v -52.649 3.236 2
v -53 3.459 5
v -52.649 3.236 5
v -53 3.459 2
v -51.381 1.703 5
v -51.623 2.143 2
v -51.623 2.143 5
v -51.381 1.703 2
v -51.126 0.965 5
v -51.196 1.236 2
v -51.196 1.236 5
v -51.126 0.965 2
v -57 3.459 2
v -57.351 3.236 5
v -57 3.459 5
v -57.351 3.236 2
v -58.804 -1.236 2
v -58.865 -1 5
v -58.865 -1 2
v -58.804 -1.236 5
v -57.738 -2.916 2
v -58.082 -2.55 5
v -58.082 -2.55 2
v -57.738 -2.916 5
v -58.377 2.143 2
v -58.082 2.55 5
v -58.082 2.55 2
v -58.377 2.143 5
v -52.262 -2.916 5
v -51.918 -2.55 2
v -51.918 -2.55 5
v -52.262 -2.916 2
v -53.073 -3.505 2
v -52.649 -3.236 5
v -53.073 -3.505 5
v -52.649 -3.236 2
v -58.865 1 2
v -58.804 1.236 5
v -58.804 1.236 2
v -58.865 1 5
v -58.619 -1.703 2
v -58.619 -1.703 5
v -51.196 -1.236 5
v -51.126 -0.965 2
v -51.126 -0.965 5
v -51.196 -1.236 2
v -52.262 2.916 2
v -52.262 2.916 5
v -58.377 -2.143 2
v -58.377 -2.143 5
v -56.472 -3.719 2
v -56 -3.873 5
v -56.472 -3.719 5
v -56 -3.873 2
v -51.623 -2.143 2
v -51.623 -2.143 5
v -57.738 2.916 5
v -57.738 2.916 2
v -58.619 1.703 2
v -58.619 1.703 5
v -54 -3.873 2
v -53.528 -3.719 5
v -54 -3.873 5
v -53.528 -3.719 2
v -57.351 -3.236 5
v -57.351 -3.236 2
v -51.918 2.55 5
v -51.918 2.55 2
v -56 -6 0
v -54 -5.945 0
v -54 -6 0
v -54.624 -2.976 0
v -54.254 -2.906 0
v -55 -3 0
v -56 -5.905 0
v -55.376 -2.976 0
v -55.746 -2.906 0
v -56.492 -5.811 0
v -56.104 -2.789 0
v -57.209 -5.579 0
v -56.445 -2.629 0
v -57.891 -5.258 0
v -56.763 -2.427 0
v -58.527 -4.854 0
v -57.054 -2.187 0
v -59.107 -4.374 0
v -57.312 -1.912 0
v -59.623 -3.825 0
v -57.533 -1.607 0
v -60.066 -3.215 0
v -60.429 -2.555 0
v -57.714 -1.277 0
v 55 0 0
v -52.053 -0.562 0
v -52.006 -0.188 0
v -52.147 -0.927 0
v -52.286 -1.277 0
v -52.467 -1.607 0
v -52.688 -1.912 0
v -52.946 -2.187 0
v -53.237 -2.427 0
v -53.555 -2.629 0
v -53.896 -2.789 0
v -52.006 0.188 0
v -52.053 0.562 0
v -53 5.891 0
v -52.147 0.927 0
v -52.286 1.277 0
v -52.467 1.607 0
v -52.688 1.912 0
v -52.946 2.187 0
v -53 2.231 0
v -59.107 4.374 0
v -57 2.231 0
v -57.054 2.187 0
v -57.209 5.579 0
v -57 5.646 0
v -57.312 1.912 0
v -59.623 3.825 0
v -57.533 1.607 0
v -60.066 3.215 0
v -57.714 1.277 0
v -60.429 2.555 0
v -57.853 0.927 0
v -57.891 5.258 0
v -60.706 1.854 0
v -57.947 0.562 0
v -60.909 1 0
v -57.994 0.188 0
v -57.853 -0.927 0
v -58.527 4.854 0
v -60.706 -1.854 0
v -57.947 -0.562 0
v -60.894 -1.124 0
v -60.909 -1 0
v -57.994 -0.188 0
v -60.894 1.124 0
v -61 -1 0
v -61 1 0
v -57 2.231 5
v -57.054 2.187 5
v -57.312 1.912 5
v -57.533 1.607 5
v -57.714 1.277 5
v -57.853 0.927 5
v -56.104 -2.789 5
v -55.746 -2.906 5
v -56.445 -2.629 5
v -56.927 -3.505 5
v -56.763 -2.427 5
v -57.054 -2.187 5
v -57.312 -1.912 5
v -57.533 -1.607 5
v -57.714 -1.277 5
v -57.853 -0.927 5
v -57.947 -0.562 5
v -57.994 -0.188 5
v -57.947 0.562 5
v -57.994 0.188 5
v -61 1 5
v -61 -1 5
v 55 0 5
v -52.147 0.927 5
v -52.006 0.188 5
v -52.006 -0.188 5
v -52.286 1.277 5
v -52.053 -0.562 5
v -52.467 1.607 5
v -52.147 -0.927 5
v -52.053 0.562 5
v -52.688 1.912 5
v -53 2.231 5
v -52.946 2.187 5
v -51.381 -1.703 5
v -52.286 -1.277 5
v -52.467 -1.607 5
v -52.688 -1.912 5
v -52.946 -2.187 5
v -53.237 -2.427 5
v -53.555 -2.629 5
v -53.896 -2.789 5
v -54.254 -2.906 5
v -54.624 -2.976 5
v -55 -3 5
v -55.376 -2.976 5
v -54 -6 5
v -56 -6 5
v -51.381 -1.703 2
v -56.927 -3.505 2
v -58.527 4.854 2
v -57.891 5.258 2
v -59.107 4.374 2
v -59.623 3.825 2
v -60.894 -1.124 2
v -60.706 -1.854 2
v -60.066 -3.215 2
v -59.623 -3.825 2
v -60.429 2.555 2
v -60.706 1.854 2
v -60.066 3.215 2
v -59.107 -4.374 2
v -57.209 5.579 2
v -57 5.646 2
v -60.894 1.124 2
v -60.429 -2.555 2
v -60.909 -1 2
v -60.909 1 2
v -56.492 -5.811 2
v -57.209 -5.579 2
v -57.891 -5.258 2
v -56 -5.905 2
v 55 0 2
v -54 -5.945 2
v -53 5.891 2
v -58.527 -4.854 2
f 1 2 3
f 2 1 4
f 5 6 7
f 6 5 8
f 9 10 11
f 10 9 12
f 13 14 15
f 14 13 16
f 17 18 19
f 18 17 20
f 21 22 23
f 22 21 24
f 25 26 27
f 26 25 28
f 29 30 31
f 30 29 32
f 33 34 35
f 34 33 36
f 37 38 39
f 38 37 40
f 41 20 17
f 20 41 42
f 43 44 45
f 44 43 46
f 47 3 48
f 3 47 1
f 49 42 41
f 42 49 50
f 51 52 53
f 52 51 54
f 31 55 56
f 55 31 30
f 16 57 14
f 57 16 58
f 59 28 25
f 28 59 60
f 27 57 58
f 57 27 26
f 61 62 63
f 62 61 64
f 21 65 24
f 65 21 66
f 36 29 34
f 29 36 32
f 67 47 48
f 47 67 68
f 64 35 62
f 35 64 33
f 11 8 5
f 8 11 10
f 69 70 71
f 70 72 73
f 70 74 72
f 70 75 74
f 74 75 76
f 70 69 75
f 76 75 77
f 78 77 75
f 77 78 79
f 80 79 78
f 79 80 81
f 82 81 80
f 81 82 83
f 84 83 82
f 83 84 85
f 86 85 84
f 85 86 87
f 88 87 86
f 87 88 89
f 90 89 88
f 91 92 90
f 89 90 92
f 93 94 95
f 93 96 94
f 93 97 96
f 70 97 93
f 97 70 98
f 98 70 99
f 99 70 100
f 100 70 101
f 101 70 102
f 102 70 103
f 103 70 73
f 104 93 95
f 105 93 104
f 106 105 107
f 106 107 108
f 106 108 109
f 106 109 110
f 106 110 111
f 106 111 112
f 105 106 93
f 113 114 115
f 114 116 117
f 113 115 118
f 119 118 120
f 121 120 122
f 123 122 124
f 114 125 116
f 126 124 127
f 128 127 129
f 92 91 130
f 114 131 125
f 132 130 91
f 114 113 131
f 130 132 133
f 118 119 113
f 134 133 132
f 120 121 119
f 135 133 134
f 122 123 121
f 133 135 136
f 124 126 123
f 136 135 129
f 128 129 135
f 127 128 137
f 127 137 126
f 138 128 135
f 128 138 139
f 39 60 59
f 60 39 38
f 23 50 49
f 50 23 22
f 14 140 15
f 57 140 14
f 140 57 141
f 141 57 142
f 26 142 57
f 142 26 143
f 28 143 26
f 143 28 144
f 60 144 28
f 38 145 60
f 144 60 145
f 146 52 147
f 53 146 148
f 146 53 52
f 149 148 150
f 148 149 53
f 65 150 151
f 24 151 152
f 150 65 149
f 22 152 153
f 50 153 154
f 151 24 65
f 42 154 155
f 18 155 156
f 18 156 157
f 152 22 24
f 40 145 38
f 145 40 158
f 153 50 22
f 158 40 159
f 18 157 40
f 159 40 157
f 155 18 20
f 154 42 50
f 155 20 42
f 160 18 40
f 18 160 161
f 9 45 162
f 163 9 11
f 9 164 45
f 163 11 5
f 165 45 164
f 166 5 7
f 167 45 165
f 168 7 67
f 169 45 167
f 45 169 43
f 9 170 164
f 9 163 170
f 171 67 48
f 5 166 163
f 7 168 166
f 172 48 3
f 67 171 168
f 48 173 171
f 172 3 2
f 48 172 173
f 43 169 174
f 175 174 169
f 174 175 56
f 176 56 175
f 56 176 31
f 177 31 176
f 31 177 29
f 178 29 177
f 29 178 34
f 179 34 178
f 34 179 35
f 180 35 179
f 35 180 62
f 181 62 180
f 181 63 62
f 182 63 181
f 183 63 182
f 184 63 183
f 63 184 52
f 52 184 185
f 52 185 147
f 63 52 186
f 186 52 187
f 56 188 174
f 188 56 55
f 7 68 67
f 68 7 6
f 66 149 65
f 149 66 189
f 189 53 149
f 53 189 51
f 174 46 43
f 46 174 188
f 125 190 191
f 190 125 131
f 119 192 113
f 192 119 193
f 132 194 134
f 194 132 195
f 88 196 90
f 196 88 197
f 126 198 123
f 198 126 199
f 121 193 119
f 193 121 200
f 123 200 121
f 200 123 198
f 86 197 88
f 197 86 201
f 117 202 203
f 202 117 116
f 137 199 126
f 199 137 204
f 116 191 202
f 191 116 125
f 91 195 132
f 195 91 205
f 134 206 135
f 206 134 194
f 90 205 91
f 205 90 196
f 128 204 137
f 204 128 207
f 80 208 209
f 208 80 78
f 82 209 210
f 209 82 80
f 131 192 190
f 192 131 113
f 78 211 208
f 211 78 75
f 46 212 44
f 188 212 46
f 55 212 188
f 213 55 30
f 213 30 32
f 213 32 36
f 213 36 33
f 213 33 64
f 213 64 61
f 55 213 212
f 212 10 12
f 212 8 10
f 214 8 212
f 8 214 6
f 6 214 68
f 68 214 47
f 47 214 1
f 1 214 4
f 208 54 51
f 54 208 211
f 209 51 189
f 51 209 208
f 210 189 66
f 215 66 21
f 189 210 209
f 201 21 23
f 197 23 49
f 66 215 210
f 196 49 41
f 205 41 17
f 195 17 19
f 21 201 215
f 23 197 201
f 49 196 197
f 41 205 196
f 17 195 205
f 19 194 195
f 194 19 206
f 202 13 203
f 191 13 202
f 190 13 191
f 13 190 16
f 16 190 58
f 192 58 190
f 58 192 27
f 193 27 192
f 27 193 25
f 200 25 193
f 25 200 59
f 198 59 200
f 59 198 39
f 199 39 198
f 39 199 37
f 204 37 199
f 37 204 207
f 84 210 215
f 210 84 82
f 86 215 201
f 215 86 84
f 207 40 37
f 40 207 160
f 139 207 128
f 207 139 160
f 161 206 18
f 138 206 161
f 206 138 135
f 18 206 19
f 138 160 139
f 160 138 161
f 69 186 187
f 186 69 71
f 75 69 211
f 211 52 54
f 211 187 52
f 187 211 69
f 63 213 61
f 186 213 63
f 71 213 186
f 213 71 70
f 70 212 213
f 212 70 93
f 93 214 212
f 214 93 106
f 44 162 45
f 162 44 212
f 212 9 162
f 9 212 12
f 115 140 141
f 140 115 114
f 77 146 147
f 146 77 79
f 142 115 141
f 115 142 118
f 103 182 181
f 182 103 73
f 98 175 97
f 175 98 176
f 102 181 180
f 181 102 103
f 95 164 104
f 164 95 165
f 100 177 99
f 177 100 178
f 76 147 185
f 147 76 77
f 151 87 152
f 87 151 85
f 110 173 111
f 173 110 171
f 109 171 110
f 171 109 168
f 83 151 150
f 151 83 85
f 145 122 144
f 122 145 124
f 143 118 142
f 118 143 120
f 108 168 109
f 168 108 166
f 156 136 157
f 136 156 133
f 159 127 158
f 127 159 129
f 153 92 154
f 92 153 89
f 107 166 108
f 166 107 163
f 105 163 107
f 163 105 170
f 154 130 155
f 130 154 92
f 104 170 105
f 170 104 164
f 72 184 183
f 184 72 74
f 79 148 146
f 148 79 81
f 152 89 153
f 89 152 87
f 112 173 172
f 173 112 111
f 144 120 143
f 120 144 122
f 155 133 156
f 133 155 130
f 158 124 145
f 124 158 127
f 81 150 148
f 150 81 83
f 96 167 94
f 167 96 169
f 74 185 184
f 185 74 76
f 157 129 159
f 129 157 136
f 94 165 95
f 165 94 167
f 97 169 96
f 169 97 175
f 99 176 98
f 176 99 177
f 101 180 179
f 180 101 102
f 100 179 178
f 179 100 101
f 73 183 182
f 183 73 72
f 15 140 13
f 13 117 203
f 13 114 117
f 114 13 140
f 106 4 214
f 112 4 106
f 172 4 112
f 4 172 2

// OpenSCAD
// Garden irrigation hose stake by Brian Enigma
// The defaults are designed for a 1/4" hose.  Feel free to adjust as needed.

// This is the inside diameter of the hook part.  Coincidentally, it's also the
// outside diameter of your hose.
INSIDE_DIAMETER = 6;

// This is the overall length of the stake
LENGTH = 110;

// This is the height (or thickness, depending on how you look at it) of the
// tallest part of the stake -- the thickness of the reinforcing ring and
// bars.
HEIGHT = 5;

// This is the thickness of all the rest of the stake that isn't a reinforcing
// ring or bar.
THICKNESS = 2;

// This is the diameter of the biggest plastic circle.
CLIP_OUTSIDE_DIAMETER = 12;

// This is the clearance you get on the slot to insert the hose.  A smaller
// value gives you a tighter fit, but it also makes the hose more difficult
// to insert.
SLOT_DIAMETER = 4;

// The detail (number of sides) of the circles.
DETAIL = 50;

// ######################################################################

REINFORCEMENT_OUTSIDE_DIAMETER = INSIDE_DIAMETER + THICKNESS;

module clip()
{
    union()
    {
        // Cylinder for holding the hose
        cylinder(h = HEIGHT, r = REINFORCEMENT_OUTSIDE_DIAMETER / 2, $fn = DETAIL);
        // Outermost cylinder
        cylinder(h = THICKNESS, r = CLIP_OUTSIDE_DIAMETER / 2, $fn = DETAIL);
        // Y-axis reinforcement bar
        translate(v = [ THICKNESS / -2, 0, 0 ]) cube(size = [ THICKNESS, CLIP_OUTSIDE_DIAMETER / 2, HEIGHT ]);
        // X-axis reinforcement bar
        translate(v = [ CLIP_OUTSIDE_DIAMETER / -2, THICKNESS / -2, 0 ])
            cube(size = [ CLIP_OUTSIDE_DIAMETER, THICKNESS, HEIGHT ]);
    }
}

module clip_hole()
{
    translate(v = [ 0, 0, -1 ]) cylinder(h = HEIGHT + 2, r = INSIDE_DIAMETER / 2, $fn = DETAIL);
    translate(v = [ 0, SLOT_DIAMETER / -2, -1 ]) cube(size = [ CLIP_OUTSIDE_DIAMETER, SLOT_DIAMETER, HEIGHT + 2 ]);
}

module stake()
{
    linear_extrude(height = THICKNESS)
        polygon(points = [[CLIP_OUTSIDE_DIAMETER / 2, 0], [0, -1 * LENGTH], [CLIP_OUTSIDE_DIAMETER / -2, 0]]);
    linear_extrude(height = HEIGHT) polygon(points = [[THICKNESS / 2, 0], [0, -1 * LENGTH], [THICKNESS / -2, 0]]);
}

translate(v = [ LENGTH / -2, 0, 0 ]) rotate(a = [ 0, 0, 90 ]) difference()
{
    union()
    {
        clip();
        stake();
    }
    clip_hole();
}
